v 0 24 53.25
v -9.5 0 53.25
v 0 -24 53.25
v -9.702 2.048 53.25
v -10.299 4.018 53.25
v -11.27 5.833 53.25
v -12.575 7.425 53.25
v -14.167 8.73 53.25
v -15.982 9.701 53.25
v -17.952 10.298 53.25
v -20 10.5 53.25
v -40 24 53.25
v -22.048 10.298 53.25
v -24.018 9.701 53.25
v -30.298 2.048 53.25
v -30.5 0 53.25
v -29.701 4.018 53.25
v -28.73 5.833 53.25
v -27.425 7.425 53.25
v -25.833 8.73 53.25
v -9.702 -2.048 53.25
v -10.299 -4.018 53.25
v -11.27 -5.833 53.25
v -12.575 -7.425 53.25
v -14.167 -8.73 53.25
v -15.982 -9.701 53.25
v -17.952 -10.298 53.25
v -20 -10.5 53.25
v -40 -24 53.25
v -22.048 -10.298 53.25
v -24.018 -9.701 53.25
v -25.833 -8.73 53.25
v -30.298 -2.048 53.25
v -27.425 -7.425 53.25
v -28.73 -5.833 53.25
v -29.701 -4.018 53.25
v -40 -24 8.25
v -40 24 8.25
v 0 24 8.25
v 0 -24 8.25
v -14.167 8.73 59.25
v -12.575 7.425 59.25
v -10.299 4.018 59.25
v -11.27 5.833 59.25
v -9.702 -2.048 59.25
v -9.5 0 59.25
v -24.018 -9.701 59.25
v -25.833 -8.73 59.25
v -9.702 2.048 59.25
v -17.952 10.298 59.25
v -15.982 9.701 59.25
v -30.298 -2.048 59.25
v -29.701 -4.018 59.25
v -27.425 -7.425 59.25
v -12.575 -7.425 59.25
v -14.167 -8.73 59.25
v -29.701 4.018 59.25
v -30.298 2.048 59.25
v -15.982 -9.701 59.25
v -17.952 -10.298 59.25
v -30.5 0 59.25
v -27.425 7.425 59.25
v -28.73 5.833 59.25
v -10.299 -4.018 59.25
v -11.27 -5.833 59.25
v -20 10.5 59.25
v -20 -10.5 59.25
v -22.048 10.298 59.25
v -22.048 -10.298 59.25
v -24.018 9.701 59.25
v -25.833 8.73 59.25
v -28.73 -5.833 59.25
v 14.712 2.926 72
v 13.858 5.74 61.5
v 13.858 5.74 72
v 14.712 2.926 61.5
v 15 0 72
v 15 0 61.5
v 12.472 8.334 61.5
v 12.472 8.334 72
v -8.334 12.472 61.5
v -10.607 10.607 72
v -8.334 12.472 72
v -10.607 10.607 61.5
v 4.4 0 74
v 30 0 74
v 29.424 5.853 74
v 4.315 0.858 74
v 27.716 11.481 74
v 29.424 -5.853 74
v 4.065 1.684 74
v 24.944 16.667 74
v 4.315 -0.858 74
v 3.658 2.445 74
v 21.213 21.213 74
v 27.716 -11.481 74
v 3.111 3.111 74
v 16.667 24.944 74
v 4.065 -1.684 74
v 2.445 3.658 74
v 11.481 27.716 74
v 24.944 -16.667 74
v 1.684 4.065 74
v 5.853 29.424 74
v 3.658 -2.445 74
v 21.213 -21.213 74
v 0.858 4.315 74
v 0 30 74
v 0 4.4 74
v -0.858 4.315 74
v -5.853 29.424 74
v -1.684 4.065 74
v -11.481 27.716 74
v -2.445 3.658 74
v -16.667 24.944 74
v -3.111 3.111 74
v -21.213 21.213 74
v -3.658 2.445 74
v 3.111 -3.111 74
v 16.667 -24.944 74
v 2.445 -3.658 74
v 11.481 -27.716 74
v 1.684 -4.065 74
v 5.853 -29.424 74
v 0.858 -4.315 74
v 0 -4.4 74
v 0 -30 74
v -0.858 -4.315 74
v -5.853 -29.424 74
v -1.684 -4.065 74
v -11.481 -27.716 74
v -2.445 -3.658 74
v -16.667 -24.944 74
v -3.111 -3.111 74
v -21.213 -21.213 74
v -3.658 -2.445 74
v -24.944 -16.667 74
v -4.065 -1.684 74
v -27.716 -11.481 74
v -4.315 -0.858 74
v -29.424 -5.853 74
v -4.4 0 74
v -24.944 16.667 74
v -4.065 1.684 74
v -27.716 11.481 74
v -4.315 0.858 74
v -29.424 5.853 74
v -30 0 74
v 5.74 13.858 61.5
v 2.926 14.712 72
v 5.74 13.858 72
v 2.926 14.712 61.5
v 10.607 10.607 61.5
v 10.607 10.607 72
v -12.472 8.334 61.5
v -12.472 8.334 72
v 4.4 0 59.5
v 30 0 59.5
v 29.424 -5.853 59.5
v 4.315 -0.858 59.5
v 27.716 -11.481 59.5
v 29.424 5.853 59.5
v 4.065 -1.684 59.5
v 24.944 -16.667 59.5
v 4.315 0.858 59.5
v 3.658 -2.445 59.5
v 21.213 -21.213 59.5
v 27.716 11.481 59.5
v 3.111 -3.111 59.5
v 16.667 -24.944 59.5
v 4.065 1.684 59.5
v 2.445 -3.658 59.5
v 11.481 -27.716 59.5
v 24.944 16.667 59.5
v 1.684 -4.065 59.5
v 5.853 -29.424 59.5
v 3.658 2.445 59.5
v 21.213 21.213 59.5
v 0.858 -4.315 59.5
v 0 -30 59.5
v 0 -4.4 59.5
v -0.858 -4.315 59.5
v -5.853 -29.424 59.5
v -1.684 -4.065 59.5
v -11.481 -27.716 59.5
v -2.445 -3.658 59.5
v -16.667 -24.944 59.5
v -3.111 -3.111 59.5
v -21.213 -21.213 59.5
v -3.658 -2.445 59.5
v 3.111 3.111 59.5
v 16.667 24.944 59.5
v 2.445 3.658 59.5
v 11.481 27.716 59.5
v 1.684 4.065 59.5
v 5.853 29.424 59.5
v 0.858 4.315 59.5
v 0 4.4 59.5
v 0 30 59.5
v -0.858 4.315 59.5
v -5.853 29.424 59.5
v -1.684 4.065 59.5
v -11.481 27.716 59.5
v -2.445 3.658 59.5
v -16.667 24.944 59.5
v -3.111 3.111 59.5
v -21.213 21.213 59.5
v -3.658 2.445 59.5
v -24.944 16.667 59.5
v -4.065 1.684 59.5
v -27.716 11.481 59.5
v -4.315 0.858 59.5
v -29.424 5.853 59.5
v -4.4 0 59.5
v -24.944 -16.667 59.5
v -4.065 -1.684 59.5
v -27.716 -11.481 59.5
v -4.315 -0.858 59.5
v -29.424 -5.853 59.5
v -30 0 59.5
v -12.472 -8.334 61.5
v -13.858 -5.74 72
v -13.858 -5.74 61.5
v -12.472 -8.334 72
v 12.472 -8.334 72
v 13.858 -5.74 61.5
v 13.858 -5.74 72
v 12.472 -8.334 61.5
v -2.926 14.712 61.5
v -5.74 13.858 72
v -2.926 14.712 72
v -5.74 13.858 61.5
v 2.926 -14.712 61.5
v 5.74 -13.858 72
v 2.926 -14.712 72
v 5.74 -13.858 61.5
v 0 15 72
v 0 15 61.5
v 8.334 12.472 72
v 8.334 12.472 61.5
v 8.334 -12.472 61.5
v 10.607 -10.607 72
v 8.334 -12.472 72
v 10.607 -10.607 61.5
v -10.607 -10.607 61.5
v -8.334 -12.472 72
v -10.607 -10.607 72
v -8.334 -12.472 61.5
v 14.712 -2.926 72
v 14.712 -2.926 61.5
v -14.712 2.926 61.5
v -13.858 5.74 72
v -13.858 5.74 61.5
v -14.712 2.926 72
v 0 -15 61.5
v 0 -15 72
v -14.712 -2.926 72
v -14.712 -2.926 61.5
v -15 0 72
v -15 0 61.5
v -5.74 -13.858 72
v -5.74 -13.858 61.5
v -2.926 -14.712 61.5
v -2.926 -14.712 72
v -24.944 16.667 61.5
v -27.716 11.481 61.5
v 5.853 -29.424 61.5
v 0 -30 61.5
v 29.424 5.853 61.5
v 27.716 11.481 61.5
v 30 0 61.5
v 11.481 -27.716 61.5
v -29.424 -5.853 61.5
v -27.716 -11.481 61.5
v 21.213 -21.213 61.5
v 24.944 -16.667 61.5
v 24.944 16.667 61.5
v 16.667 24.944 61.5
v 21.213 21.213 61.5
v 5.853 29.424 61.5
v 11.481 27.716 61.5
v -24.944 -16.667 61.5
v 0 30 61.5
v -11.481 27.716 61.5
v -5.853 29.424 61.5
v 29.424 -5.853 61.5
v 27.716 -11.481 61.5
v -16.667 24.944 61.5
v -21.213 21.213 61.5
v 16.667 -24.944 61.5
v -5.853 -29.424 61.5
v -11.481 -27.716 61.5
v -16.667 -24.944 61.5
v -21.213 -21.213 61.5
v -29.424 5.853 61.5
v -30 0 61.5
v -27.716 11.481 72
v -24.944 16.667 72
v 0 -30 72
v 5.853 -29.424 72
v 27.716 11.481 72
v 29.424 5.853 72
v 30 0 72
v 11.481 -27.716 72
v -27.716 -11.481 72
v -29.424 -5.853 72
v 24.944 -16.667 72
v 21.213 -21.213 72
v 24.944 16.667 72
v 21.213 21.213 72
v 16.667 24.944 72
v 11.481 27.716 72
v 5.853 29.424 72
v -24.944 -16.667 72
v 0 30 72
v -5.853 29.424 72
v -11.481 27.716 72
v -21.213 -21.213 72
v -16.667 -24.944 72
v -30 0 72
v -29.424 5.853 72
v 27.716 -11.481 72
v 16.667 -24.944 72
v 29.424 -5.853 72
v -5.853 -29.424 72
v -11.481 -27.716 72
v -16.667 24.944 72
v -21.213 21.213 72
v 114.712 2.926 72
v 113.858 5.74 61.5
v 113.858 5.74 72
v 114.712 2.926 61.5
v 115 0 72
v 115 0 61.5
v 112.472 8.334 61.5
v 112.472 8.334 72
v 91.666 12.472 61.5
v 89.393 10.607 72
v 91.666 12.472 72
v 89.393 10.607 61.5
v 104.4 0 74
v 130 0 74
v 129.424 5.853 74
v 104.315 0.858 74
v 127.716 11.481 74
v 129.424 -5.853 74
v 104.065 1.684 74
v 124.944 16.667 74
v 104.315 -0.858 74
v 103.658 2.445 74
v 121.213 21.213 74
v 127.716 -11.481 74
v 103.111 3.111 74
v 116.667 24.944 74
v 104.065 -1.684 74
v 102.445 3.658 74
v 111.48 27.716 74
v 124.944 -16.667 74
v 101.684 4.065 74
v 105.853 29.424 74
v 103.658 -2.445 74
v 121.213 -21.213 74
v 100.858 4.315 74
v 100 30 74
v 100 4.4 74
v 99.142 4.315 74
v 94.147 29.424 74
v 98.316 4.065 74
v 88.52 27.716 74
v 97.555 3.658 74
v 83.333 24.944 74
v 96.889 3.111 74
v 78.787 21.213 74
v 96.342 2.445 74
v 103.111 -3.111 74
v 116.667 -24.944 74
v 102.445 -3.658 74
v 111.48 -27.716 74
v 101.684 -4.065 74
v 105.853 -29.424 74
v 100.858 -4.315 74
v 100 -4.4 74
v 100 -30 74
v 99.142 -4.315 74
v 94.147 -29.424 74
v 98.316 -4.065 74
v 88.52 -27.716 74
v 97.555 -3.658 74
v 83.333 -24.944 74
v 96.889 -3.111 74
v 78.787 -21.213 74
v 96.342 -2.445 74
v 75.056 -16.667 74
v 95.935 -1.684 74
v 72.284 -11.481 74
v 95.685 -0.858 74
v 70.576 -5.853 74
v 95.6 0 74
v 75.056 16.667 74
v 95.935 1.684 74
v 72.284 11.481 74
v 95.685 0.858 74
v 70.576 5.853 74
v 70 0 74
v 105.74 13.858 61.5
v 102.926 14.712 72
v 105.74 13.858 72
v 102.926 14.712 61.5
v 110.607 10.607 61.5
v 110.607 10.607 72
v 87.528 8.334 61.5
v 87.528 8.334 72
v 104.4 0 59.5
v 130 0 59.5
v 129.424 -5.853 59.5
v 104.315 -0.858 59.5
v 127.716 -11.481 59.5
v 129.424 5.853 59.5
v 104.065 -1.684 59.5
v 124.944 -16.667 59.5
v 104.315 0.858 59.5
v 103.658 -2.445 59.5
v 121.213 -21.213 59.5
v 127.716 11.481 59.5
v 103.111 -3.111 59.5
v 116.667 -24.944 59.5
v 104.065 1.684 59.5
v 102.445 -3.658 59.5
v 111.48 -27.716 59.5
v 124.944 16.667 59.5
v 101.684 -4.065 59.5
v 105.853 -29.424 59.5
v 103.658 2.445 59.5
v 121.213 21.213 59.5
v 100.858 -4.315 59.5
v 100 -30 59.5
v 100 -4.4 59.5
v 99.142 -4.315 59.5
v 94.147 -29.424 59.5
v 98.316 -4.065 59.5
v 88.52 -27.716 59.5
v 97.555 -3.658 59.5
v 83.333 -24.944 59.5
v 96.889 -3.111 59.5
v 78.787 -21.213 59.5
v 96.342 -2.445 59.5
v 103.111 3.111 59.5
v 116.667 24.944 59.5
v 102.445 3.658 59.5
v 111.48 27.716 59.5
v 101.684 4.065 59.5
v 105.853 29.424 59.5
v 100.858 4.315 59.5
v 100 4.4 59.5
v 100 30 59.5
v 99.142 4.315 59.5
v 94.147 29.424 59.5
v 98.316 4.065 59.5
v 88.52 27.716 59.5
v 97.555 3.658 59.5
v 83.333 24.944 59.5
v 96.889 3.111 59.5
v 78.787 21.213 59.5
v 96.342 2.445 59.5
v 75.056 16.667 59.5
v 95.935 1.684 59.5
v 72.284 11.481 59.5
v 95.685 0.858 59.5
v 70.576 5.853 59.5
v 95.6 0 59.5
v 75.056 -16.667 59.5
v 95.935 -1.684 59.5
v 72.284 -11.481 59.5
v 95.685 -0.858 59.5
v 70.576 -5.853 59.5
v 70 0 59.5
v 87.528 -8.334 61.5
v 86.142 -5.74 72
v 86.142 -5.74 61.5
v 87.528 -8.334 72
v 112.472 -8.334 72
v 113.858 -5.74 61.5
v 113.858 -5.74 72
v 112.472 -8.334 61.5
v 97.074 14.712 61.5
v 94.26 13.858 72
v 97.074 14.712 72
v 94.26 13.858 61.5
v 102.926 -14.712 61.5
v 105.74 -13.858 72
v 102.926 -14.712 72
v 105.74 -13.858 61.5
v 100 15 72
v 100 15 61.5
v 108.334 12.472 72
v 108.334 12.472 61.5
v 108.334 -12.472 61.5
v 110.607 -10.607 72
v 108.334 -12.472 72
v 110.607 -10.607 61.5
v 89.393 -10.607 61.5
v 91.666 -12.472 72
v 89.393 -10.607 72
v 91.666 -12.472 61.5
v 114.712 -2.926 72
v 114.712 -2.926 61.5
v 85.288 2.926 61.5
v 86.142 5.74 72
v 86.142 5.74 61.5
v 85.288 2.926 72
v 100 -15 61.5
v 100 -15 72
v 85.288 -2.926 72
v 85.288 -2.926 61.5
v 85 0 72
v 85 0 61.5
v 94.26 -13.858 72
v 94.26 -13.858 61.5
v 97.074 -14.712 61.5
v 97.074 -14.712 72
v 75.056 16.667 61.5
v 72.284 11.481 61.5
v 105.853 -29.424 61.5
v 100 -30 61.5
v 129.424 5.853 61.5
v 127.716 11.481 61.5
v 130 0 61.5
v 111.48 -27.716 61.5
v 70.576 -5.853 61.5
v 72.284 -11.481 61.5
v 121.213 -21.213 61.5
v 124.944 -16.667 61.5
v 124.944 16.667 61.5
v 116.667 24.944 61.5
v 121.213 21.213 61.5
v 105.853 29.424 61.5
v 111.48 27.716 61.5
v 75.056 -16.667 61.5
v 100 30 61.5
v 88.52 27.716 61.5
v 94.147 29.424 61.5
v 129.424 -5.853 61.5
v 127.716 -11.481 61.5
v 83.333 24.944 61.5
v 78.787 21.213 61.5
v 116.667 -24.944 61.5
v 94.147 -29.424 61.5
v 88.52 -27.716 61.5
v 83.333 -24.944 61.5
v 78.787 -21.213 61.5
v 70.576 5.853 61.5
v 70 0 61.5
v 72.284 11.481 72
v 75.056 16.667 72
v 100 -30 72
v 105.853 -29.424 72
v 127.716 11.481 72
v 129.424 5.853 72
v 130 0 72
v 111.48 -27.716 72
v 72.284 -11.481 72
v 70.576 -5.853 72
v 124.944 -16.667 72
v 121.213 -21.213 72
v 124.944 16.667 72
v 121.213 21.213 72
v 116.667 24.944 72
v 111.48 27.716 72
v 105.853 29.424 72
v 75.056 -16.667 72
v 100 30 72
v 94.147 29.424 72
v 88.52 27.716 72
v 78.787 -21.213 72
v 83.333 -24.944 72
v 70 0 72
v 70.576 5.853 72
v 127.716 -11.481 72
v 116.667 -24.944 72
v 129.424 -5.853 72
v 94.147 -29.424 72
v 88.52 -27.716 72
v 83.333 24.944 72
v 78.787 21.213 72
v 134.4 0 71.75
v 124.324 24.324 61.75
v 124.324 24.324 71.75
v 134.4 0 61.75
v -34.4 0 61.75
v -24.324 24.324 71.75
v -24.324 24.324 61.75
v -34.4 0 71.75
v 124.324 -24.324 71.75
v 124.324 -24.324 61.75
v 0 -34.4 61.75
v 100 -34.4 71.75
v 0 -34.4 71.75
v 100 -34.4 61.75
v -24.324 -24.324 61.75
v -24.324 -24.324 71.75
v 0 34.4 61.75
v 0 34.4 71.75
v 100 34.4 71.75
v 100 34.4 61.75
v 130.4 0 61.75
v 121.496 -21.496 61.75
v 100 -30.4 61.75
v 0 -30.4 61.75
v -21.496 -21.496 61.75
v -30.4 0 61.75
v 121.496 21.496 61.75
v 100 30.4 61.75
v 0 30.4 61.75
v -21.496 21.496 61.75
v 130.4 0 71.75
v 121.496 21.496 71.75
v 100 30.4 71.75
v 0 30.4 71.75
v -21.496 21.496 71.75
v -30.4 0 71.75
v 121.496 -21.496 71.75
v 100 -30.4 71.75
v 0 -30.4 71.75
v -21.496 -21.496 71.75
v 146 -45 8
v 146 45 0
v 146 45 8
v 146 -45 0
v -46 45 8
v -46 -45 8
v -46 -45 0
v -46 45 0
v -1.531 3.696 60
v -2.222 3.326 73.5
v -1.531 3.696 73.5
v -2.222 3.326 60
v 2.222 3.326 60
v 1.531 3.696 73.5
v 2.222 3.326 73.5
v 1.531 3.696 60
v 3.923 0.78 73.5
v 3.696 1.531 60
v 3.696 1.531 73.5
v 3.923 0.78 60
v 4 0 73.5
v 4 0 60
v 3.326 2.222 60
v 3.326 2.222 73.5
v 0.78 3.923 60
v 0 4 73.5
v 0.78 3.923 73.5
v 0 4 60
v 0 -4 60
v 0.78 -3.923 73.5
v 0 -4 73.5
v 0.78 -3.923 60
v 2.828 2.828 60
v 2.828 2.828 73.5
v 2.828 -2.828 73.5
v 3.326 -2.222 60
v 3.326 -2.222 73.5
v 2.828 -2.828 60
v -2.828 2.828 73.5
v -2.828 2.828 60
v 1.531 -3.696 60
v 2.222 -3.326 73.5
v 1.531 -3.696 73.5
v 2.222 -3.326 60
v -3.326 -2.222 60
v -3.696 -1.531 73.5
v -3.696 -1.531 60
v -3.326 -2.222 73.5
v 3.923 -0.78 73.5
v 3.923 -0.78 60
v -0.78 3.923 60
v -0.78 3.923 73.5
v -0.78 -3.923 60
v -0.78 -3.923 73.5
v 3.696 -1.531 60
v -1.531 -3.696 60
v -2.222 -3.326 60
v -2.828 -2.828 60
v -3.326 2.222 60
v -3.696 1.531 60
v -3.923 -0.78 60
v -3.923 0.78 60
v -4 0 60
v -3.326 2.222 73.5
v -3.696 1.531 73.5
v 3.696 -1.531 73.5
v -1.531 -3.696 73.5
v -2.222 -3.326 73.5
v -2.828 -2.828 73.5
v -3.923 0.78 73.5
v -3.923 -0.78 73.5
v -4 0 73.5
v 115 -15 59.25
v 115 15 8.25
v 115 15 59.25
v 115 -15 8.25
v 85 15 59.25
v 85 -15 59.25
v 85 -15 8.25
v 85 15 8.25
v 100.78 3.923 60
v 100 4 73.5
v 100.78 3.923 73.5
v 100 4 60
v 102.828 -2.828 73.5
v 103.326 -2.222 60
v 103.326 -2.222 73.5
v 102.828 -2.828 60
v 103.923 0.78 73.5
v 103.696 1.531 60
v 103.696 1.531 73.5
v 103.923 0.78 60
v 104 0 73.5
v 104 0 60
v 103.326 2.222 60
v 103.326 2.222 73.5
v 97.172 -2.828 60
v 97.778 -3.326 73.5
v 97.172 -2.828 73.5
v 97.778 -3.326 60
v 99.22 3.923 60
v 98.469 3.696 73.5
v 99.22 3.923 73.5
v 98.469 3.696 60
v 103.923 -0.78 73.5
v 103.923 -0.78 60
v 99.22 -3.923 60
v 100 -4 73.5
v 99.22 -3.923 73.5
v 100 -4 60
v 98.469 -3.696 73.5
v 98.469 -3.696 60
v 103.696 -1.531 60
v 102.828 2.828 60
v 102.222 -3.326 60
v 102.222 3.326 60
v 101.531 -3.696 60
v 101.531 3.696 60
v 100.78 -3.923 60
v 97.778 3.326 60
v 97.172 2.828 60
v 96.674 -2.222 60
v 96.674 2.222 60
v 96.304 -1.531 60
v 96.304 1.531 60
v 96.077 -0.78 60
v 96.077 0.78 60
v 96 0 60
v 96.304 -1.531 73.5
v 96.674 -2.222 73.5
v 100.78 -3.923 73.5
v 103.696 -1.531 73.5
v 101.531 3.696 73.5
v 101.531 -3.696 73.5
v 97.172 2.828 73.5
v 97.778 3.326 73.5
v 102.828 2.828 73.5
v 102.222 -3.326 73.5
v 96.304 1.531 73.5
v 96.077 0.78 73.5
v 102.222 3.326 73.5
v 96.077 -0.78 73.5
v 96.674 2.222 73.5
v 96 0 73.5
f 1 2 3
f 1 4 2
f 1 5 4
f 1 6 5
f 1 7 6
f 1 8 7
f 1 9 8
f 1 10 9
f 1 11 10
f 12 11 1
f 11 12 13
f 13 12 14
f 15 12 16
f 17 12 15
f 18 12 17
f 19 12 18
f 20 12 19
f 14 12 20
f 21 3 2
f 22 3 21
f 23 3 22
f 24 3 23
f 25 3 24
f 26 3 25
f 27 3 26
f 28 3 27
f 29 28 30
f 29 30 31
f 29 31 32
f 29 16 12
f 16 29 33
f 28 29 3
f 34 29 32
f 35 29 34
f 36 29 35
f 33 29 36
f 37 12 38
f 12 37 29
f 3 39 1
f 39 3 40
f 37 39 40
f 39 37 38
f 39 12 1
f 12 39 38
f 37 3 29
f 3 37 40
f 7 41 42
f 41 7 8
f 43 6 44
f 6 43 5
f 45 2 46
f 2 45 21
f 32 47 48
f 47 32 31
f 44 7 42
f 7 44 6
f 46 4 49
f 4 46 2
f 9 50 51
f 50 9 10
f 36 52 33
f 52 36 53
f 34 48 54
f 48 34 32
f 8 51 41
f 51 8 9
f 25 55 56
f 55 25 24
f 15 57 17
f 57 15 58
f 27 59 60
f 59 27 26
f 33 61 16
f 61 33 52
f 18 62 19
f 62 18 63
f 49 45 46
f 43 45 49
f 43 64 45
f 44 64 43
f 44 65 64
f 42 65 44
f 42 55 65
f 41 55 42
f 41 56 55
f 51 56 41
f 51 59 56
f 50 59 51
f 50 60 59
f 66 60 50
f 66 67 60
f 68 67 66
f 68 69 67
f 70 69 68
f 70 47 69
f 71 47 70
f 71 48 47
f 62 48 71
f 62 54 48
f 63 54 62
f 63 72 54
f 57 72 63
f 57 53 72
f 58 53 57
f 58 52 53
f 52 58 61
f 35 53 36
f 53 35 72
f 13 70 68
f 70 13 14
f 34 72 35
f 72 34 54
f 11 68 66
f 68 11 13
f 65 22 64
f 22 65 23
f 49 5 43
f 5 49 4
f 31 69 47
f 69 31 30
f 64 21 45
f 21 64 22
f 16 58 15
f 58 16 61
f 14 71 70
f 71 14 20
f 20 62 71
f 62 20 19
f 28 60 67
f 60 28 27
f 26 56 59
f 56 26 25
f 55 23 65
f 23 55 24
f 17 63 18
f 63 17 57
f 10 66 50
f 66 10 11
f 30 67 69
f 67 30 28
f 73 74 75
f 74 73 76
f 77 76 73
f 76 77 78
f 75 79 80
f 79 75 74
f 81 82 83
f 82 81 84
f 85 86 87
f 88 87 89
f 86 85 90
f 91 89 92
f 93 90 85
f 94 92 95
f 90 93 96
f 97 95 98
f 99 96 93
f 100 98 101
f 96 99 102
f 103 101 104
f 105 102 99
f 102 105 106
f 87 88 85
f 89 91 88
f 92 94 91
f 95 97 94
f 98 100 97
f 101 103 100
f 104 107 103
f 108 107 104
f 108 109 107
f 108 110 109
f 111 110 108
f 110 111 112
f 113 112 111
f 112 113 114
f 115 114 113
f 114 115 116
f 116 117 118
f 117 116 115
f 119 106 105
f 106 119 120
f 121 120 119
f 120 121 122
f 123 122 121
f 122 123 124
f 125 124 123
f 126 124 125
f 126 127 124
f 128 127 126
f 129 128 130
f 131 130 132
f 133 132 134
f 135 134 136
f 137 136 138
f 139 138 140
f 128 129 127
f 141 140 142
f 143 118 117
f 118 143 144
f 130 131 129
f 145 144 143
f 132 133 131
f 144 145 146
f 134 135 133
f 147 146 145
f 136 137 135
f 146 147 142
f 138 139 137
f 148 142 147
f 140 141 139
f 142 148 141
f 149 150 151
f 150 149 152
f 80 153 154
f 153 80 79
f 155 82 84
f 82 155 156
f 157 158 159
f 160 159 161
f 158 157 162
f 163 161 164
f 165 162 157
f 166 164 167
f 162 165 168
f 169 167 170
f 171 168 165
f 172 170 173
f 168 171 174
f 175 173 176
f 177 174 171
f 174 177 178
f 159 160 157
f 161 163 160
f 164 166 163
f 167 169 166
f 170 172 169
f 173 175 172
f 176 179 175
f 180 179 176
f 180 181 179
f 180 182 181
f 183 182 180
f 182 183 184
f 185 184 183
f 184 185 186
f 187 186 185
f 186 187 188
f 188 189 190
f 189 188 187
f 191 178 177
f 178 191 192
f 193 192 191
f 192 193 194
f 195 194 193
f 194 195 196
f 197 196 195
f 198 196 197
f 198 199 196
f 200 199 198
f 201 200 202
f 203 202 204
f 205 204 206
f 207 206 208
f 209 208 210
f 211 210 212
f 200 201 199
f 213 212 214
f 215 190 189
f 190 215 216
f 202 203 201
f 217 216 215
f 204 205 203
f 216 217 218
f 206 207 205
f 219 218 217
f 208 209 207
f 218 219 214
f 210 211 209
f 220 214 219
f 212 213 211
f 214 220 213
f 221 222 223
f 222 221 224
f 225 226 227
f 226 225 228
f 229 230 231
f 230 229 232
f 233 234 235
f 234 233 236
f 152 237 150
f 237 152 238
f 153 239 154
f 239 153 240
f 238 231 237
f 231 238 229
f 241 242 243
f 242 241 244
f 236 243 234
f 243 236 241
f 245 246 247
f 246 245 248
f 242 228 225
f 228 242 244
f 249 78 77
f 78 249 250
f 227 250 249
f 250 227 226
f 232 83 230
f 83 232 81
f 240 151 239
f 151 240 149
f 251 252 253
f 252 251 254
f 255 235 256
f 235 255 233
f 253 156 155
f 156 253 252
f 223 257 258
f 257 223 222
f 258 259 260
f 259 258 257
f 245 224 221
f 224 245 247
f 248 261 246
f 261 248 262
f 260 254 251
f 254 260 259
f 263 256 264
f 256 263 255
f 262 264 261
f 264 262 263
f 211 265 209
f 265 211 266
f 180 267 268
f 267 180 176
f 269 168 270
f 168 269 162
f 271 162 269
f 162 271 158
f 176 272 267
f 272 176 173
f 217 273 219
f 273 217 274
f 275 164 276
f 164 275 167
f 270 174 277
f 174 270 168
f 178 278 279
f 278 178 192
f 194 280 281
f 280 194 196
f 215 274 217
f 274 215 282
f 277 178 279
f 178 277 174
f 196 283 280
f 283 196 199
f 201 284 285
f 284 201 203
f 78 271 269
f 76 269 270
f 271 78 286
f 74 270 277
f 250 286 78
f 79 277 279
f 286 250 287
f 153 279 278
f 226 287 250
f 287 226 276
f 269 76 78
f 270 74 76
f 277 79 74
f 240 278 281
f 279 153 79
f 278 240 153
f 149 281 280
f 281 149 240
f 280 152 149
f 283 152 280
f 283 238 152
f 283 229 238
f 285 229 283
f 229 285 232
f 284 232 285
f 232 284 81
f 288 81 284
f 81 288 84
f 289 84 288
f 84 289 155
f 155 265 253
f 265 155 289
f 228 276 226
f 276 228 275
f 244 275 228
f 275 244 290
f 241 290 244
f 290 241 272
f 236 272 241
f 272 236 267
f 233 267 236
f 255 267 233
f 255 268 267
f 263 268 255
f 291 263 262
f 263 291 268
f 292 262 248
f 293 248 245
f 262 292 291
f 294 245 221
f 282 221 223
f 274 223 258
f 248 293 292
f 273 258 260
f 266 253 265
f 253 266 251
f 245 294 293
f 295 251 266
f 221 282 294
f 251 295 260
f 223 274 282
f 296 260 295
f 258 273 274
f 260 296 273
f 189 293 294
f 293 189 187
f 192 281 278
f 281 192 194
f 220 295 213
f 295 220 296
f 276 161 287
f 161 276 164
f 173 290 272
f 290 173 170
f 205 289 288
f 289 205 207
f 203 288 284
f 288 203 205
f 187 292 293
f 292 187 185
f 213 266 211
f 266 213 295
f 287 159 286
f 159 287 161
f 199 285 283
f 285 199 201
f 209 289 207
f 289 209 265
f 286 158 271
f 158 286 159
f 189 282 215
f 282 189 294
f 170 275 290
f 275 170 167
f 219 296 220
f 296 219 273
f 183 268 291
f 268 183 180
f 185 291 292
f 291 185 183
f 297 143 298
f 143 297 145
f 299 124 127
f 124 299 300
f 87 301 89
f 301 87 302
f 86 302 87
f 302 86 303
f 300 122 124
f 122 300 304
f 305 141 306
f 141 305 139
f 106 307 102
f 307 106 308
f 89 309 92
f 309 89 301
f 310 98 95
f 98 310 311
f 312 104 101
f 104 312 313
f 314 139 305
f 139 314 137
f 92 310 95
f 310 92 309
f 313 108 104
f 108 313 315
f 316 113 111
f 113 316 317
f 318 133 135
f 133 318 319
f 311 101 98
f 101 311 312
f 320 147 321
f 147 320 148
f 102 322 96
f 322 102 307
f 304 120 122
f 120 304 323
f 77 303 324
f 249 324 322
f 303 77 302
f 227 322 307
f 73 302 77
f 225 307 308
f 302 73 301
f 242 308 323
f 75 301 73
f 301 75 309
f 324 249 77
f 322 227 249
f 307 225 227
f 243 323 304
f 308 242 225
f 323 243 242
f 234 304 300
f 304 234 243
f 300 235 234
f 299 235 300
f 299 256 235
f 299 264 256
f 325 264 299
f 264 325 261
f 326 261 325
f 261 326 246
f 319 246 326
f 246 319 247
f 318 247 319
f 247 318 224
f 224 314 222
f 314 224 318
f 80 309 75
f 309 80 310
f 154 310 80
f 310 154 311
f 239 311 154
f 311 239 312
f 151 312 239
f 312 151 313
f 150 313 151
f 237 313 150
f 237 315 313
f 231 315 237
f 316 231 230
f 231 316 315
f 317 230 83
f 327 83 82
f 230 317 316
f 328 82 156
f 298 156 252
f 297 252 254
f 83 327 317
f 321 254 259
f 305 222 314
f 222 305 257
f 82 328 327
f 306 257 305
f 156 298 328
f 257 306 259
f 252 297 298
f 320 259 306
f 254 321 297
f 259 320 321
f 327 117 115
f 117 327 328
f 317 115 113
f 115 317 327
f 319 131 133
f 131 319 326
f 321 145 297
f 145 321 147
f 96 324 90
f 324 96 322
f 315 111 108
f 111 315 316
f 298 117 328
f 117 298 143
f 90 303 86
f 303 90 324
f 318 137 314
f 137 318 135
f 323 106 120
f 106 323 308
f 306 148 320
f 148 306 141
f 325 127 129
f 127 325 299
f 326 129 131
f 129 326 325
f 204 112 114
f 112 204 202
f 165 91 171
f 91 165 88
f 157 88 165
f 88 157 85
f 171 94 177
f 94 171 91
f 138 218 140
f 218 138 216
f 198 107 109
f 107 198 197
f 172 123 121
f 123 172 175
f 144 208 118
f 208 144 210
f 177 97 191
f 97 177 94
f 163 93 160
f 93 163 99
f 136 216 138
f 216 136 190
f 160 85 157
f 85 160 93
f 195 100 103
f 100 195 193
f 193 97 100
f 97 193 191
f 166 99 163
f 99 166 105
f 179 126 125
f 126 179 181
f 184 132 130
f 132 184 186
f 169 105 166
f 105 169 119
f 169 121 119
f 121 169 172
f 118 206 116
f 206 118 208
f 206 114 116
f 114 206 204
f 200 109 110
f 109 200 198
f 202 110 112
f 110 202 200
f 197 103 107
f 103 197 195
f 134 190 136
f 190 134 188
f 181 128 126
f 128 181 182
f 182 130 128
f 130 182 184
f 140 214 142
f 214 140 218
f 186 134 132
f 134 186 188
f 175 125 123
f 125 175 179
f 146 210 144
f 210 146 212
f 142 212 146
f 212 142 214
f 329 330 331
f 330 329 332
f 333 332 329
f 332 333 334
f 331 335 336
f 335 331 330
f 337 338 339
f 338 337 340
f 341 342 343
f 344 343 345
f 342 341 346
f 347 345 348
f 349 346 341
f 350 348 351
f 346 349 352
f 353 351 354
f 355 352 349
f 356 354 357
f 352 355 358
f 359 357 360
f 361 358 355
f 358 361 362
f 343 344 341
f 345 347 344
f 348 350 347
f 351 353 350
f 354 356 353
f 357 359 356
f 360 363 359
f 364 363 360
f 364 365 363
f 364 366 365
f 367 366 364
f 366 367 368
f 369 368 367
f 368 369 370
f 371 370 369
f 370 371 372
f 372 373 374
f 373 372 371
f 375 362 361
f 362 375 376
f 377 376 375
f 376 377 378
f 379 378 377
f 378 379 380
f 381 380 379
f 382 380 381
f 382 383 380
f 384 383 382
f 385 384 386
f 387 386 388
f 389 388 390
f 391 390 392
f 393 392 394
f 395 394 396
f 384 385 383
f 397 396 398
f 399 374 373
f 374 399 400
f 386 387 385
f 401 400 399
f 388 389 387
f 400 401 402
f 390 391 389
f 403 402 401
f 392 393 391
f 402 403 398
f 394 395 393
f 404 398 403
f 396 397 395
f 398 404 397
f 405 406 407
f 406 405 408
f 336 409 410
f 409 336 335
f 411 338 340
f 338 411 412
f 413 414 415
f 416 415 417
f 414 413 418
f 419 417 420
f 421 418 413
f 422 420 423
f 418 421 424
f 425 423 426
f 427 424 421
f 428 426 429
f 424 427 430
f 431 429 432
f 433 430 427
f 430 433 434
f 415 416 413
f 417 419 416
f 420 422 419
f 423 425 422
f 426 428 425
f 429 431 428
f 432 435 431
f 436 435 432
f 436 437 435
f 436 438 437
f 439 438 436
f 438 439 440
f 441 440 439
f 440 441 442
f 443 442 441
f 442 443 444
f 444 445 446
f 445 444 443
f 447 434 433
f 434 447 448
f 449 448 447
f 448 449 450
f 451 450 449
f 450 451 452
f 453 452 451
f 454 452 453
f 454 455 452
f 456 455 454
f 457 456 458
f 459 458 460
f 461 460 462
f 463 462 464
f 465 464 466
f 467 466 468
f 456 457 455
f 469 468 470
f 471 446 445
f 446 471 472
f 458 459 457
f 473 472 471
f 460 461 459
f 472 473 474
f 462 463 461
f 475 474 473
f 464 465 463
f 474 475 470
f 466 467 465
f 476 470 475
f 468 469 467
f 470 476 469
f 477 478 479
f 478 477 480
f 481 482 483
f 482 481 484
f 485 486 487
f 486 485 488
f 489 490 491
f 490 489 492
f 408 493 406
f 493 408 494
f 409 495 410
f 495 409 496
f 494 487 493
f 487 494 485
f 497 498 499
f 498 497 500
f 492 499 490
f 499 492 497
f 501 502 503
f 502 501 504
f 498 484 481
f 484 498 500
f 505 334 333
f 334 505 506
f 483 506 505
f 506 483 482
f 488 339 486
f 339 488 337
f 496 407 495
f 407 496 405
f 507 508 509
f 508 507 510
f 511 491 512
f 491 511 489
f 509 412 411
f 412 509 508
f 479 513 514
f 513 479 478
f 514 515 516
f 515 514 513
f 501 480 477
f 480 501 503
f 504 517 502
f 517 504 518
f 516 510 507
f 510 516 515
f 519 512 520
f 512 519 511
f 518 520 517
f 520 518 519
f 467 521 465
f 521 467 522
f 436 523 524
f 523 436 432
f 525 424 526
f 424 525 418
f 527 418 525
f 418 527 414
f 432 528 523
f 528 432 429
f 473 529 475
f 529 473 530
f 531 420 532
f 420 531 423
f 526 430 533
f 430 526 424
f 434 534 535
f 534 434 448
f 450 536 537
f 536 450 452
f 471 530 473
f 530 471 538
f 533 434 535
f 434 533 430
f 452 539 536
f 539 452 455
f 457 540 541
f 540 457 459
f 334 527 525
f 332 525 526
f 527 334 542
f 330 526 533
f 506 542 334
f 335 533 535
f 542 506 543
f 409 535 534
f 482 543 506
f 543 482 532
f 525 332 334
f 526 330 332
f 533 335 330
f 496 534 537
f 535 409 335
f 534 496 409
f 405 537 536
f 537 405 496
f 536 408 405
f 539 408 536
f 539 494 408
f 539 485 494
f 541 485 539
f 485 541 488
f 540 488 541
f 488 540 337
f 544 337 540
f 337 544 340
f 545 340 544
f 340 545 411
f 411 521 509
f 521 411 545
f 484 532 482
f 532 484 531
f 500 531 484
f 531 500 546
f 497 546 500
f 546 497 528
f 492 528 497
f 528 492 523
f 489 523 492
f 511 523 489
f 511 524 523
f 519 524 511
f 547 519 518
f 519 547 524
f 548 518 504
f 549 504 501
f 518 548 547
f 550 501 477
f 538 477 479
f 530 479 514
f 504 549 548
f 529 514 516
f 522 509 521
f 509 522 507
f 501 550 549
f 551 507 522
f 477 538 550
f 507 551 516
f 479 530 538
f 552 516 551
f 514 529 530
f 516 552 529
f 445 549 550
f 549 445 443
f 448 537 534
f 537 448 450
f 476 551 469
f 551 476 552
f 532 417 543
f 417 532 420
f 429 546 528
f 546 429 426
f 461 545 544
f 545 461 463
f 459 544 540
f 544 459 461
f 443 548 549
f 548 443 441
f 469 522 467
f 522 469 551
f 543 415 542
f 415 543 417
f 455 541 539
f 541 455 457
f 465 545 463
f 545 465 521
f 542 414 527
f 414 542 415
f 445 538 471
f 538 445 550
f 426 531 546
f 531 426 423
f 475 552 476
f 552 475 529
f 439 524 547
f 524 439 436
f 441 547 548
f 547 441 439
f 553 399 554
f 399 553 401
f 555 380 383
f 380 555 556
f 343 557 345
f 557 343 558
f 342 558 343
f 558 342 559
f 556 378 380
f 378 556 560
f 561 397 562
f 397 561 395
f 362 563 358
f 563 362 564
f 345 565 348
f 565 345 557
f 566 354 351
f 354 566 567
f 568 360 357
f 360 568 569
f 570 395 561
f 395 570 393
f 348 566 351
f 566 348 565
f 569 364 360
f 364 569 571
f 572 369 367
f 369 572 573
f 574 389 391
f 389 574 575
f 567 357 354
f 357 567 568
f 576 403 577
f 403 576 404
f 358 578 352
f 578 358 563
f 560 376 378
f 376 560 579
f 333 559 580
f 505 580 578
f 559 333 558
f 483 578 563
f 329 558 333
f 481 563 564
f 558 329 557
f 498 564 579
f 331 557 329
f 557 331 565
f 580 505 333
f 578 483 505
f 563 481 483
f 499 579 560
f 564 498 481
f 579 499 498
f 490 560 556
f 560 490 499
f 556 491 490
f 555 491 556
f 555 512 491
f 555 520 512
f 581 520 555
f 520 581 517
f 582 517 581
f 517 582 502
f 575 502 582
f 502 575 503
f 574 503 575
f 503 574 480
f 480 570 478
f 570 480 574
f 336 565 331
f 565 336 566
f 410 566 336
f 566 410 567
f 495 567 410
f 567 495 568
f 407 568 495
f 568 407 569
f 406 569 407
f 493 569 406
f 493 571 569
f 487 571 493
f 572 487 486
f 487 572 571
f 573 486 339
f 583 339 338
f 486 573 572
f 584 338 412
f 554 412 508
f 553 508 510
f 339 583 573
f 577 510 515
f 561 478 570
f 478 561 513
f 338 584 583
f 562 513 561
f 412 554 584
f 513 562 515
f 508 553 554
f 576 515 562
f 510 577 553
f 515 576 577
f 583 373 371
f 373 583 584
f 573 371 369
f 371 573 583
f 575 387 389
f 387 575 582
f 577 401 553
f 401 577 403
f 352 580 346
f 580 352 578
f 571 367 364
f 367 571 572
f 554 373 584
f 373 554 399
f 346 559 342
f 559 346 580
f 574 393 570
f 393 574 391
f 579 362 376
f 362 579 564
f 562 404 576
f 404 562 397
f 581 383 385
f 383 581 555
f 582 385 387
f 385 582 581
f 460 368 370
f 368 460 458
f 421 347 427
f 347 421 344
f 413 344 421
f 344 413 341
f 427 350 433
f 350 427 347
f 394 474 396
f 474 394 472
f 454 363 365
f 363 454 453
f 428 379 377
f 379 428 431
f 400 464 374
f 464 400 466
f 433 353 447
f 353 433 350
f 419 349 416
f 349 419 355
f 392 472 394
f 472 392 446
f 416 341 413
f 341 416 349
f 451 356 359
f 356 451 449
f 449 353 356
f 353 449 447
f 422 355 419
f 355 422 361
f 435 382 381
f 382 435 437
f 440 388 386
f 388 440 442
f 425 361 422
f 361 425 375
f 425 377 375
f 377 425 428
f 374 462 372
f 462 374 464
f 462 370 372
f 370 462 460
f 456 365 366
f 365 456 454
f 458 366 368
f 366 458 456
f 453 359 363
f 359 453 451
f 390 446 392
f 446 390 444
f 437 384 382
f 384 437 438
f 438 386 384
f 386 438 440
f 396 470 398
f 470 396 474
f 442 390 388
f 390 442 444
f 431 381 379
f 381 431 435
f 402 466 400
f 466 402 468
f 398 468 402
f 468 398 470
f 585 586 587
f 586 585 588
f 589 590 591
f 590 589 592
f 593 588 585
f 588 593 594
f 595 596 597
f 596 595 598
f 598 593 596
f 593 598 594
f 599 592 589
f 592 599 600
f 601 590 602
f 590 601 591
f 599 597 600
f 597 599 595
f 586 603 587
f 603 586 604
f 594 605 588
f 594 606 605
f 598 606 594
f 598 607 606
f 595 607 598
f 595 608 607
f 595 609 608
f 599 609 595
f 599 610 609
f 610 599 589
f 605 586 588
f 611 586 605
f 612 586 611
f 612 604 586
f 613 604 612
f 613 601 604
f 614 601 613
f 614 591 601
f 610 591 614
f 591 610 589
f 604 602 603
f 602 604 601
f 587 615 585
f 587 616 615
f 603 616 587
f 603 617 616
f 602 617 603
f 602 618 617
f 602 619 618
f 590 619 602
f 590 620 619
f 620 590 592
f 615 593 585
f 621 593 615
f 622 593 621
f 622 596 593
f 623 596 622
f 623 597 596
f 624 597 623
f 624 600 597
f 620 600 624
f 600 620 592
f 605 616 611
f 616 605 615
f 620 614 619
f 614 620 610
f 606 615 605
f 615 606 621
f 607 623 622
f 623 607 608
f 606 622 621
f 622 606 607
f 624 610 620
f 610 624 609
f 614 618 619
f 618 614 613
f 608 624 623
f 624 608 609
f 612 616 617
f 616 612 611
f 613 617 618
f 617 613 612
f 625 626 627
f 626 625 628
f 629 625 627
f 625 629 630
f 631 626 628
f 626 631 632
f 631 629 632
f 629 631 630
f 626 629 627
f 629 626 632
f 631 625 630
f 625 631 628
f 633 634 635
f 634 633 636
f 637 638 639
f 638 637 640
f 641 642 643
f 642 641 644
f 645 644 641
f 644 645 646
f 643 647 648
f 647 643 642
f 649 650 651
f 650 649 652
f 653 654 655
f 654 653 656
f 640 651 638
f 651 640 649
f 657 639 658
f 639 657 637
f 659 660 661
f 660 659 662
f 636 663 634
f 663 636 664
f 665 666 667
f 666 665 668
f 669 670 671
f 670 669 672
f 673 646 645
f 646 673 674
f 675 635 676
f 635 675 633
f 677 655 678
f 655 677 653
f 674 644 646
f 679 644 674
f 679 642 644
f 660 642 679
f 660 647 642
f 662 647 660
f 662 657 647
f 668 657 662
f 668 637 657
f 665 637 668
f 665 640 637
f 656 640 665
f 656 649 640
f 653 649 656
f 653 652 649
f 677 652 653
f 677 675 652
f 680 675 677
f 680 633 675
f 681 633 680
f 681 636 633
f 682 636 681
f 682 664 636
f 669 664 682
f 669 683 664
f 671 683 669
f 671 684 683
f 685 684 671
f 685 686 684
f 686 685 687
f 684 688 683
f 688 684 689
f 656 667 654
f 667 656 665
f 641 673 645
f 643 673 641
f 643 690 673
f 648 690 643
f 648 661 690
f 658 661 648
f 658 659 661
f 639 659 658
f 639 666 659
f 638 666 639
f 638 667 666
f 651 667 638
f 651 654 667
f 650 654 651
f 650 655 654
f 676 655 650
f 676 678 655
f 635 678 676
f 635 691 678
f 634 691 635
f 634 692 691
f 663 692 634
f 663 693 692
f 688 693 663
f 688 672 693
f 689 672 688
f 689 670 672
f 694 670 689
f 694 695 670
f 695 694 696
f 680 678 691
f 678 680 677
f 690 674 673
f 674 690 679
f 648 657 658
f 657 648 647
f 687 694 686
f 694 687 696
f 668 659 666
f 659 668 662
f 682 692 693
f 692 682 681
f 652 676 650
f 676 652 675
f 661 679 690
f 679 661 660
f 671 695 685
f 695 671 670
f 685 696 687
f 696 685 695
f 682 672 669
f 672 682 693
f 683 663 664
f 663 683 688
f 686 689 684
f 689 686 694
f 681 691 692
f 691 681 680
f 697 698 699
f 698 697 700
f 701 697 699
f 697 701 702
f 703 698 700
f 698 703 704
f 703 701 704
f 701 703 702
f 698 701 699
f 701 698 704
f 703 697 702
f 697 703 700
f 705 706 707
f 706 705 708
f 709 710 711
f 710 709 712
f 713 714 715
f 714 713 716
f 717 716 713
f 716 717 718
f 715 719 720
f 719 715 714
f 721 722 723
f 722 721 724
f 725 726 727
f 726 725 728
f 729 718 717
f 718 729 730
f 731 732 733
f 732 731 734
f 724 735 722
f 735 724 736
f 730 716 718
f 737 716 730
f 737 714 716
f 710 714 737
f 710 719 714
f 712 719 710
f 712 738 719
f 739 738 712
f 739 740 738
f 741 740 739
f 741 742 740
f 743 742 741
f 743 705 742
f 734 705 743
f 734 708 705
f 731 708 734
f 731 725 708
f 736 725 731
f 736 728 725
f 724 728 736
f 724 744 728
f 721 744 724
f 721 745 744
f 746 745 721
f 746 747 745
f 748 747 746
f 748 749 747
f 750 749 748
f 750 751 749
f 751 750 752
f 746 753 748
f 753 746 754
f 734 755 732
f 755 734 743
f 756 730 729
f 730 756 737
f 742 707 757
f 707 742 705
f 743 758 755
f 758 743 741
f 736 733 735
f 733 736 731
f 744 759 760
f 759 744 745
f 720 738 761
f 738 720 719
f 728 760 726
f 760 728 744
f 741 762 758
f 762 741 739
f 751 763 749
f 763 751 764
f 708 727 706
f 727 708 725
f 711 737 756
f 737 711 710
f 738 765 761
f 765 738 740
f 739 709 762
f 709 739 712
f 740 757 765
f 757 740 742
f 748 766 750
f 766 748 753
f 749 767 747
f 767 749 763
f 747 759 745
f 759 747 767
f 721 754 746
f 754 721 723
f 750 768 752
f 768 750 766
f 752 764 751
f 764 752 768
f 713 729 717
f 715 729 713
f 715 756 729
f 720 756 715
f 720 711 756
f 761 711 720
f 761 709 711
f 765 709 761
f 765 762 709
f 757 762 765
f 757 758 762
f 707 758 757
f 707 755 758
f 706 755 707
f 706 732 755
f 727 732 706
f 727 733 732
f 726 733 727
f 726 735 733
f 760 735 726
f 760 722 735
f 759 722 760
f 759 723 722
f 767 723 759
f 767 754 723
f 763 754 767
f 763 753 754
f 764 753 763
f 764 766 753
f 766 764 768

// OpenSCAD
$fn = 32;

// ------------------------------------------------------------------------
// Motor belt drive: span 100 mm, pulleys d60, belt 10 mm wide
// Every part is its own module, assembly() places every instance.
// ------------------------------------------------------------------------

// --- part 1 ---
module base_plate() {
  difference() {
    translate([-96, -45, 0]) cube([192, 90, 8]);
  }
}

// --- part 2 ---
module motor() {
  union() {
    translate([-22.5, -24, 0]) cube([45, 48, 40]);
    translate([25.5, 0, 20]) rotate([0, 90, 0]) cylinder(h = 6, d = 21, center = true);
  }
}

// --- part 3 ---
module drive_shaft() {
  translate([0, 0, -6.75]) cylinder(h = 13.5, d = 8);
}

// --- part 4 ---
module pulley_drive() {
  difference() {
    union() {
      cylinder(h = 14.5, d = 30);
      cylinder(h = 2, d = 60);
      translate([0, 0, 12.5]) cylinder(h = 2, d = 60);
    }
    translate([0, 0, -1]) cylinder(h = 16.5, d = 8.8);
  }
}

// --- part 5 ---
module idler_post() {
  translate([-15, -15, 0]) cube([30, 30, 51]);
}

// --- part 6 ---
module driven_shaft() {
  translate([0, 0, -6.75]) cylinder(h = 13.5, d = 8);
}

// --- part 7 ---
module pulley_driven() {
  difference() {
    union() {
      cylinder(h = 14.5, d = 30);
      cylinder(h = 2, d = 60);
      translate([0, 0, 12.5]) cylinder(h = 2, d = 60);
    }
    translate([0, 0, -1]) cylinder(h = 16.5, d = 8.8);
  }
}

// --- part 8 ---
module drive_belt() {
  difference() {
    linear_extrude(height = 10) polygon(points = concat([for (a = [90 : 45 : 270]) [34.4 * cos(a), 34.4 * sin(a)]], [for (a = [270 : 45 : 450]) [100 + 34.4 * cos(a), 34.4 * sin(a)]]));
    translate([0, 0, -1]) linear_extrude(height = 12) polygon(points = concat([for (a = [90 : 45 : 270]) [30.4 * cos(a), 30.4 * sin(a)]], [for (a = [270 : 45 : 450]) [100 + 30.4 * cos(a), 30.4 * sin(a)]]));
  }
}

// --- assembly ---
module assembly() {
  color([0.80, 0.24, 0.20]) translate([50, 0, 0]) rotate([0, 0, 0]) base_plate();
  color([0.20, 0.45, 0.75]) translate([0, 0, 30.75]) rotate([0, 270, 0]) motor();
  color([0.25, 0.62, 0.32]) translate([0, 0, 66.75]) rotate([0, 0, 0]) drive_shaft();
  color([0.92, 0.70, 0.18]) translate([0, 0, 59.5]) rotate([0, 0, 0]) pulley_drive();
  color([0.58, 0.35, 0.70]) translate([100, 0, 8.25]) rotate([0, 0, 0]) idler_post();
  color([0.16, 0.66, 0.66]) translate([100, 0, 66.75]) rotate([0, 0, 0]) driven_shaft();
  color([0.85, 0.48, 0.18]) translate([100, 0, 59.5]) rotate([0, 0, 0]) pulley_driven();
  color([0.55, 0.60, 0.65]) translate([0, 0, 61.75]) rotate([0, 0, 0]) drive_belt();
}

assembly();
